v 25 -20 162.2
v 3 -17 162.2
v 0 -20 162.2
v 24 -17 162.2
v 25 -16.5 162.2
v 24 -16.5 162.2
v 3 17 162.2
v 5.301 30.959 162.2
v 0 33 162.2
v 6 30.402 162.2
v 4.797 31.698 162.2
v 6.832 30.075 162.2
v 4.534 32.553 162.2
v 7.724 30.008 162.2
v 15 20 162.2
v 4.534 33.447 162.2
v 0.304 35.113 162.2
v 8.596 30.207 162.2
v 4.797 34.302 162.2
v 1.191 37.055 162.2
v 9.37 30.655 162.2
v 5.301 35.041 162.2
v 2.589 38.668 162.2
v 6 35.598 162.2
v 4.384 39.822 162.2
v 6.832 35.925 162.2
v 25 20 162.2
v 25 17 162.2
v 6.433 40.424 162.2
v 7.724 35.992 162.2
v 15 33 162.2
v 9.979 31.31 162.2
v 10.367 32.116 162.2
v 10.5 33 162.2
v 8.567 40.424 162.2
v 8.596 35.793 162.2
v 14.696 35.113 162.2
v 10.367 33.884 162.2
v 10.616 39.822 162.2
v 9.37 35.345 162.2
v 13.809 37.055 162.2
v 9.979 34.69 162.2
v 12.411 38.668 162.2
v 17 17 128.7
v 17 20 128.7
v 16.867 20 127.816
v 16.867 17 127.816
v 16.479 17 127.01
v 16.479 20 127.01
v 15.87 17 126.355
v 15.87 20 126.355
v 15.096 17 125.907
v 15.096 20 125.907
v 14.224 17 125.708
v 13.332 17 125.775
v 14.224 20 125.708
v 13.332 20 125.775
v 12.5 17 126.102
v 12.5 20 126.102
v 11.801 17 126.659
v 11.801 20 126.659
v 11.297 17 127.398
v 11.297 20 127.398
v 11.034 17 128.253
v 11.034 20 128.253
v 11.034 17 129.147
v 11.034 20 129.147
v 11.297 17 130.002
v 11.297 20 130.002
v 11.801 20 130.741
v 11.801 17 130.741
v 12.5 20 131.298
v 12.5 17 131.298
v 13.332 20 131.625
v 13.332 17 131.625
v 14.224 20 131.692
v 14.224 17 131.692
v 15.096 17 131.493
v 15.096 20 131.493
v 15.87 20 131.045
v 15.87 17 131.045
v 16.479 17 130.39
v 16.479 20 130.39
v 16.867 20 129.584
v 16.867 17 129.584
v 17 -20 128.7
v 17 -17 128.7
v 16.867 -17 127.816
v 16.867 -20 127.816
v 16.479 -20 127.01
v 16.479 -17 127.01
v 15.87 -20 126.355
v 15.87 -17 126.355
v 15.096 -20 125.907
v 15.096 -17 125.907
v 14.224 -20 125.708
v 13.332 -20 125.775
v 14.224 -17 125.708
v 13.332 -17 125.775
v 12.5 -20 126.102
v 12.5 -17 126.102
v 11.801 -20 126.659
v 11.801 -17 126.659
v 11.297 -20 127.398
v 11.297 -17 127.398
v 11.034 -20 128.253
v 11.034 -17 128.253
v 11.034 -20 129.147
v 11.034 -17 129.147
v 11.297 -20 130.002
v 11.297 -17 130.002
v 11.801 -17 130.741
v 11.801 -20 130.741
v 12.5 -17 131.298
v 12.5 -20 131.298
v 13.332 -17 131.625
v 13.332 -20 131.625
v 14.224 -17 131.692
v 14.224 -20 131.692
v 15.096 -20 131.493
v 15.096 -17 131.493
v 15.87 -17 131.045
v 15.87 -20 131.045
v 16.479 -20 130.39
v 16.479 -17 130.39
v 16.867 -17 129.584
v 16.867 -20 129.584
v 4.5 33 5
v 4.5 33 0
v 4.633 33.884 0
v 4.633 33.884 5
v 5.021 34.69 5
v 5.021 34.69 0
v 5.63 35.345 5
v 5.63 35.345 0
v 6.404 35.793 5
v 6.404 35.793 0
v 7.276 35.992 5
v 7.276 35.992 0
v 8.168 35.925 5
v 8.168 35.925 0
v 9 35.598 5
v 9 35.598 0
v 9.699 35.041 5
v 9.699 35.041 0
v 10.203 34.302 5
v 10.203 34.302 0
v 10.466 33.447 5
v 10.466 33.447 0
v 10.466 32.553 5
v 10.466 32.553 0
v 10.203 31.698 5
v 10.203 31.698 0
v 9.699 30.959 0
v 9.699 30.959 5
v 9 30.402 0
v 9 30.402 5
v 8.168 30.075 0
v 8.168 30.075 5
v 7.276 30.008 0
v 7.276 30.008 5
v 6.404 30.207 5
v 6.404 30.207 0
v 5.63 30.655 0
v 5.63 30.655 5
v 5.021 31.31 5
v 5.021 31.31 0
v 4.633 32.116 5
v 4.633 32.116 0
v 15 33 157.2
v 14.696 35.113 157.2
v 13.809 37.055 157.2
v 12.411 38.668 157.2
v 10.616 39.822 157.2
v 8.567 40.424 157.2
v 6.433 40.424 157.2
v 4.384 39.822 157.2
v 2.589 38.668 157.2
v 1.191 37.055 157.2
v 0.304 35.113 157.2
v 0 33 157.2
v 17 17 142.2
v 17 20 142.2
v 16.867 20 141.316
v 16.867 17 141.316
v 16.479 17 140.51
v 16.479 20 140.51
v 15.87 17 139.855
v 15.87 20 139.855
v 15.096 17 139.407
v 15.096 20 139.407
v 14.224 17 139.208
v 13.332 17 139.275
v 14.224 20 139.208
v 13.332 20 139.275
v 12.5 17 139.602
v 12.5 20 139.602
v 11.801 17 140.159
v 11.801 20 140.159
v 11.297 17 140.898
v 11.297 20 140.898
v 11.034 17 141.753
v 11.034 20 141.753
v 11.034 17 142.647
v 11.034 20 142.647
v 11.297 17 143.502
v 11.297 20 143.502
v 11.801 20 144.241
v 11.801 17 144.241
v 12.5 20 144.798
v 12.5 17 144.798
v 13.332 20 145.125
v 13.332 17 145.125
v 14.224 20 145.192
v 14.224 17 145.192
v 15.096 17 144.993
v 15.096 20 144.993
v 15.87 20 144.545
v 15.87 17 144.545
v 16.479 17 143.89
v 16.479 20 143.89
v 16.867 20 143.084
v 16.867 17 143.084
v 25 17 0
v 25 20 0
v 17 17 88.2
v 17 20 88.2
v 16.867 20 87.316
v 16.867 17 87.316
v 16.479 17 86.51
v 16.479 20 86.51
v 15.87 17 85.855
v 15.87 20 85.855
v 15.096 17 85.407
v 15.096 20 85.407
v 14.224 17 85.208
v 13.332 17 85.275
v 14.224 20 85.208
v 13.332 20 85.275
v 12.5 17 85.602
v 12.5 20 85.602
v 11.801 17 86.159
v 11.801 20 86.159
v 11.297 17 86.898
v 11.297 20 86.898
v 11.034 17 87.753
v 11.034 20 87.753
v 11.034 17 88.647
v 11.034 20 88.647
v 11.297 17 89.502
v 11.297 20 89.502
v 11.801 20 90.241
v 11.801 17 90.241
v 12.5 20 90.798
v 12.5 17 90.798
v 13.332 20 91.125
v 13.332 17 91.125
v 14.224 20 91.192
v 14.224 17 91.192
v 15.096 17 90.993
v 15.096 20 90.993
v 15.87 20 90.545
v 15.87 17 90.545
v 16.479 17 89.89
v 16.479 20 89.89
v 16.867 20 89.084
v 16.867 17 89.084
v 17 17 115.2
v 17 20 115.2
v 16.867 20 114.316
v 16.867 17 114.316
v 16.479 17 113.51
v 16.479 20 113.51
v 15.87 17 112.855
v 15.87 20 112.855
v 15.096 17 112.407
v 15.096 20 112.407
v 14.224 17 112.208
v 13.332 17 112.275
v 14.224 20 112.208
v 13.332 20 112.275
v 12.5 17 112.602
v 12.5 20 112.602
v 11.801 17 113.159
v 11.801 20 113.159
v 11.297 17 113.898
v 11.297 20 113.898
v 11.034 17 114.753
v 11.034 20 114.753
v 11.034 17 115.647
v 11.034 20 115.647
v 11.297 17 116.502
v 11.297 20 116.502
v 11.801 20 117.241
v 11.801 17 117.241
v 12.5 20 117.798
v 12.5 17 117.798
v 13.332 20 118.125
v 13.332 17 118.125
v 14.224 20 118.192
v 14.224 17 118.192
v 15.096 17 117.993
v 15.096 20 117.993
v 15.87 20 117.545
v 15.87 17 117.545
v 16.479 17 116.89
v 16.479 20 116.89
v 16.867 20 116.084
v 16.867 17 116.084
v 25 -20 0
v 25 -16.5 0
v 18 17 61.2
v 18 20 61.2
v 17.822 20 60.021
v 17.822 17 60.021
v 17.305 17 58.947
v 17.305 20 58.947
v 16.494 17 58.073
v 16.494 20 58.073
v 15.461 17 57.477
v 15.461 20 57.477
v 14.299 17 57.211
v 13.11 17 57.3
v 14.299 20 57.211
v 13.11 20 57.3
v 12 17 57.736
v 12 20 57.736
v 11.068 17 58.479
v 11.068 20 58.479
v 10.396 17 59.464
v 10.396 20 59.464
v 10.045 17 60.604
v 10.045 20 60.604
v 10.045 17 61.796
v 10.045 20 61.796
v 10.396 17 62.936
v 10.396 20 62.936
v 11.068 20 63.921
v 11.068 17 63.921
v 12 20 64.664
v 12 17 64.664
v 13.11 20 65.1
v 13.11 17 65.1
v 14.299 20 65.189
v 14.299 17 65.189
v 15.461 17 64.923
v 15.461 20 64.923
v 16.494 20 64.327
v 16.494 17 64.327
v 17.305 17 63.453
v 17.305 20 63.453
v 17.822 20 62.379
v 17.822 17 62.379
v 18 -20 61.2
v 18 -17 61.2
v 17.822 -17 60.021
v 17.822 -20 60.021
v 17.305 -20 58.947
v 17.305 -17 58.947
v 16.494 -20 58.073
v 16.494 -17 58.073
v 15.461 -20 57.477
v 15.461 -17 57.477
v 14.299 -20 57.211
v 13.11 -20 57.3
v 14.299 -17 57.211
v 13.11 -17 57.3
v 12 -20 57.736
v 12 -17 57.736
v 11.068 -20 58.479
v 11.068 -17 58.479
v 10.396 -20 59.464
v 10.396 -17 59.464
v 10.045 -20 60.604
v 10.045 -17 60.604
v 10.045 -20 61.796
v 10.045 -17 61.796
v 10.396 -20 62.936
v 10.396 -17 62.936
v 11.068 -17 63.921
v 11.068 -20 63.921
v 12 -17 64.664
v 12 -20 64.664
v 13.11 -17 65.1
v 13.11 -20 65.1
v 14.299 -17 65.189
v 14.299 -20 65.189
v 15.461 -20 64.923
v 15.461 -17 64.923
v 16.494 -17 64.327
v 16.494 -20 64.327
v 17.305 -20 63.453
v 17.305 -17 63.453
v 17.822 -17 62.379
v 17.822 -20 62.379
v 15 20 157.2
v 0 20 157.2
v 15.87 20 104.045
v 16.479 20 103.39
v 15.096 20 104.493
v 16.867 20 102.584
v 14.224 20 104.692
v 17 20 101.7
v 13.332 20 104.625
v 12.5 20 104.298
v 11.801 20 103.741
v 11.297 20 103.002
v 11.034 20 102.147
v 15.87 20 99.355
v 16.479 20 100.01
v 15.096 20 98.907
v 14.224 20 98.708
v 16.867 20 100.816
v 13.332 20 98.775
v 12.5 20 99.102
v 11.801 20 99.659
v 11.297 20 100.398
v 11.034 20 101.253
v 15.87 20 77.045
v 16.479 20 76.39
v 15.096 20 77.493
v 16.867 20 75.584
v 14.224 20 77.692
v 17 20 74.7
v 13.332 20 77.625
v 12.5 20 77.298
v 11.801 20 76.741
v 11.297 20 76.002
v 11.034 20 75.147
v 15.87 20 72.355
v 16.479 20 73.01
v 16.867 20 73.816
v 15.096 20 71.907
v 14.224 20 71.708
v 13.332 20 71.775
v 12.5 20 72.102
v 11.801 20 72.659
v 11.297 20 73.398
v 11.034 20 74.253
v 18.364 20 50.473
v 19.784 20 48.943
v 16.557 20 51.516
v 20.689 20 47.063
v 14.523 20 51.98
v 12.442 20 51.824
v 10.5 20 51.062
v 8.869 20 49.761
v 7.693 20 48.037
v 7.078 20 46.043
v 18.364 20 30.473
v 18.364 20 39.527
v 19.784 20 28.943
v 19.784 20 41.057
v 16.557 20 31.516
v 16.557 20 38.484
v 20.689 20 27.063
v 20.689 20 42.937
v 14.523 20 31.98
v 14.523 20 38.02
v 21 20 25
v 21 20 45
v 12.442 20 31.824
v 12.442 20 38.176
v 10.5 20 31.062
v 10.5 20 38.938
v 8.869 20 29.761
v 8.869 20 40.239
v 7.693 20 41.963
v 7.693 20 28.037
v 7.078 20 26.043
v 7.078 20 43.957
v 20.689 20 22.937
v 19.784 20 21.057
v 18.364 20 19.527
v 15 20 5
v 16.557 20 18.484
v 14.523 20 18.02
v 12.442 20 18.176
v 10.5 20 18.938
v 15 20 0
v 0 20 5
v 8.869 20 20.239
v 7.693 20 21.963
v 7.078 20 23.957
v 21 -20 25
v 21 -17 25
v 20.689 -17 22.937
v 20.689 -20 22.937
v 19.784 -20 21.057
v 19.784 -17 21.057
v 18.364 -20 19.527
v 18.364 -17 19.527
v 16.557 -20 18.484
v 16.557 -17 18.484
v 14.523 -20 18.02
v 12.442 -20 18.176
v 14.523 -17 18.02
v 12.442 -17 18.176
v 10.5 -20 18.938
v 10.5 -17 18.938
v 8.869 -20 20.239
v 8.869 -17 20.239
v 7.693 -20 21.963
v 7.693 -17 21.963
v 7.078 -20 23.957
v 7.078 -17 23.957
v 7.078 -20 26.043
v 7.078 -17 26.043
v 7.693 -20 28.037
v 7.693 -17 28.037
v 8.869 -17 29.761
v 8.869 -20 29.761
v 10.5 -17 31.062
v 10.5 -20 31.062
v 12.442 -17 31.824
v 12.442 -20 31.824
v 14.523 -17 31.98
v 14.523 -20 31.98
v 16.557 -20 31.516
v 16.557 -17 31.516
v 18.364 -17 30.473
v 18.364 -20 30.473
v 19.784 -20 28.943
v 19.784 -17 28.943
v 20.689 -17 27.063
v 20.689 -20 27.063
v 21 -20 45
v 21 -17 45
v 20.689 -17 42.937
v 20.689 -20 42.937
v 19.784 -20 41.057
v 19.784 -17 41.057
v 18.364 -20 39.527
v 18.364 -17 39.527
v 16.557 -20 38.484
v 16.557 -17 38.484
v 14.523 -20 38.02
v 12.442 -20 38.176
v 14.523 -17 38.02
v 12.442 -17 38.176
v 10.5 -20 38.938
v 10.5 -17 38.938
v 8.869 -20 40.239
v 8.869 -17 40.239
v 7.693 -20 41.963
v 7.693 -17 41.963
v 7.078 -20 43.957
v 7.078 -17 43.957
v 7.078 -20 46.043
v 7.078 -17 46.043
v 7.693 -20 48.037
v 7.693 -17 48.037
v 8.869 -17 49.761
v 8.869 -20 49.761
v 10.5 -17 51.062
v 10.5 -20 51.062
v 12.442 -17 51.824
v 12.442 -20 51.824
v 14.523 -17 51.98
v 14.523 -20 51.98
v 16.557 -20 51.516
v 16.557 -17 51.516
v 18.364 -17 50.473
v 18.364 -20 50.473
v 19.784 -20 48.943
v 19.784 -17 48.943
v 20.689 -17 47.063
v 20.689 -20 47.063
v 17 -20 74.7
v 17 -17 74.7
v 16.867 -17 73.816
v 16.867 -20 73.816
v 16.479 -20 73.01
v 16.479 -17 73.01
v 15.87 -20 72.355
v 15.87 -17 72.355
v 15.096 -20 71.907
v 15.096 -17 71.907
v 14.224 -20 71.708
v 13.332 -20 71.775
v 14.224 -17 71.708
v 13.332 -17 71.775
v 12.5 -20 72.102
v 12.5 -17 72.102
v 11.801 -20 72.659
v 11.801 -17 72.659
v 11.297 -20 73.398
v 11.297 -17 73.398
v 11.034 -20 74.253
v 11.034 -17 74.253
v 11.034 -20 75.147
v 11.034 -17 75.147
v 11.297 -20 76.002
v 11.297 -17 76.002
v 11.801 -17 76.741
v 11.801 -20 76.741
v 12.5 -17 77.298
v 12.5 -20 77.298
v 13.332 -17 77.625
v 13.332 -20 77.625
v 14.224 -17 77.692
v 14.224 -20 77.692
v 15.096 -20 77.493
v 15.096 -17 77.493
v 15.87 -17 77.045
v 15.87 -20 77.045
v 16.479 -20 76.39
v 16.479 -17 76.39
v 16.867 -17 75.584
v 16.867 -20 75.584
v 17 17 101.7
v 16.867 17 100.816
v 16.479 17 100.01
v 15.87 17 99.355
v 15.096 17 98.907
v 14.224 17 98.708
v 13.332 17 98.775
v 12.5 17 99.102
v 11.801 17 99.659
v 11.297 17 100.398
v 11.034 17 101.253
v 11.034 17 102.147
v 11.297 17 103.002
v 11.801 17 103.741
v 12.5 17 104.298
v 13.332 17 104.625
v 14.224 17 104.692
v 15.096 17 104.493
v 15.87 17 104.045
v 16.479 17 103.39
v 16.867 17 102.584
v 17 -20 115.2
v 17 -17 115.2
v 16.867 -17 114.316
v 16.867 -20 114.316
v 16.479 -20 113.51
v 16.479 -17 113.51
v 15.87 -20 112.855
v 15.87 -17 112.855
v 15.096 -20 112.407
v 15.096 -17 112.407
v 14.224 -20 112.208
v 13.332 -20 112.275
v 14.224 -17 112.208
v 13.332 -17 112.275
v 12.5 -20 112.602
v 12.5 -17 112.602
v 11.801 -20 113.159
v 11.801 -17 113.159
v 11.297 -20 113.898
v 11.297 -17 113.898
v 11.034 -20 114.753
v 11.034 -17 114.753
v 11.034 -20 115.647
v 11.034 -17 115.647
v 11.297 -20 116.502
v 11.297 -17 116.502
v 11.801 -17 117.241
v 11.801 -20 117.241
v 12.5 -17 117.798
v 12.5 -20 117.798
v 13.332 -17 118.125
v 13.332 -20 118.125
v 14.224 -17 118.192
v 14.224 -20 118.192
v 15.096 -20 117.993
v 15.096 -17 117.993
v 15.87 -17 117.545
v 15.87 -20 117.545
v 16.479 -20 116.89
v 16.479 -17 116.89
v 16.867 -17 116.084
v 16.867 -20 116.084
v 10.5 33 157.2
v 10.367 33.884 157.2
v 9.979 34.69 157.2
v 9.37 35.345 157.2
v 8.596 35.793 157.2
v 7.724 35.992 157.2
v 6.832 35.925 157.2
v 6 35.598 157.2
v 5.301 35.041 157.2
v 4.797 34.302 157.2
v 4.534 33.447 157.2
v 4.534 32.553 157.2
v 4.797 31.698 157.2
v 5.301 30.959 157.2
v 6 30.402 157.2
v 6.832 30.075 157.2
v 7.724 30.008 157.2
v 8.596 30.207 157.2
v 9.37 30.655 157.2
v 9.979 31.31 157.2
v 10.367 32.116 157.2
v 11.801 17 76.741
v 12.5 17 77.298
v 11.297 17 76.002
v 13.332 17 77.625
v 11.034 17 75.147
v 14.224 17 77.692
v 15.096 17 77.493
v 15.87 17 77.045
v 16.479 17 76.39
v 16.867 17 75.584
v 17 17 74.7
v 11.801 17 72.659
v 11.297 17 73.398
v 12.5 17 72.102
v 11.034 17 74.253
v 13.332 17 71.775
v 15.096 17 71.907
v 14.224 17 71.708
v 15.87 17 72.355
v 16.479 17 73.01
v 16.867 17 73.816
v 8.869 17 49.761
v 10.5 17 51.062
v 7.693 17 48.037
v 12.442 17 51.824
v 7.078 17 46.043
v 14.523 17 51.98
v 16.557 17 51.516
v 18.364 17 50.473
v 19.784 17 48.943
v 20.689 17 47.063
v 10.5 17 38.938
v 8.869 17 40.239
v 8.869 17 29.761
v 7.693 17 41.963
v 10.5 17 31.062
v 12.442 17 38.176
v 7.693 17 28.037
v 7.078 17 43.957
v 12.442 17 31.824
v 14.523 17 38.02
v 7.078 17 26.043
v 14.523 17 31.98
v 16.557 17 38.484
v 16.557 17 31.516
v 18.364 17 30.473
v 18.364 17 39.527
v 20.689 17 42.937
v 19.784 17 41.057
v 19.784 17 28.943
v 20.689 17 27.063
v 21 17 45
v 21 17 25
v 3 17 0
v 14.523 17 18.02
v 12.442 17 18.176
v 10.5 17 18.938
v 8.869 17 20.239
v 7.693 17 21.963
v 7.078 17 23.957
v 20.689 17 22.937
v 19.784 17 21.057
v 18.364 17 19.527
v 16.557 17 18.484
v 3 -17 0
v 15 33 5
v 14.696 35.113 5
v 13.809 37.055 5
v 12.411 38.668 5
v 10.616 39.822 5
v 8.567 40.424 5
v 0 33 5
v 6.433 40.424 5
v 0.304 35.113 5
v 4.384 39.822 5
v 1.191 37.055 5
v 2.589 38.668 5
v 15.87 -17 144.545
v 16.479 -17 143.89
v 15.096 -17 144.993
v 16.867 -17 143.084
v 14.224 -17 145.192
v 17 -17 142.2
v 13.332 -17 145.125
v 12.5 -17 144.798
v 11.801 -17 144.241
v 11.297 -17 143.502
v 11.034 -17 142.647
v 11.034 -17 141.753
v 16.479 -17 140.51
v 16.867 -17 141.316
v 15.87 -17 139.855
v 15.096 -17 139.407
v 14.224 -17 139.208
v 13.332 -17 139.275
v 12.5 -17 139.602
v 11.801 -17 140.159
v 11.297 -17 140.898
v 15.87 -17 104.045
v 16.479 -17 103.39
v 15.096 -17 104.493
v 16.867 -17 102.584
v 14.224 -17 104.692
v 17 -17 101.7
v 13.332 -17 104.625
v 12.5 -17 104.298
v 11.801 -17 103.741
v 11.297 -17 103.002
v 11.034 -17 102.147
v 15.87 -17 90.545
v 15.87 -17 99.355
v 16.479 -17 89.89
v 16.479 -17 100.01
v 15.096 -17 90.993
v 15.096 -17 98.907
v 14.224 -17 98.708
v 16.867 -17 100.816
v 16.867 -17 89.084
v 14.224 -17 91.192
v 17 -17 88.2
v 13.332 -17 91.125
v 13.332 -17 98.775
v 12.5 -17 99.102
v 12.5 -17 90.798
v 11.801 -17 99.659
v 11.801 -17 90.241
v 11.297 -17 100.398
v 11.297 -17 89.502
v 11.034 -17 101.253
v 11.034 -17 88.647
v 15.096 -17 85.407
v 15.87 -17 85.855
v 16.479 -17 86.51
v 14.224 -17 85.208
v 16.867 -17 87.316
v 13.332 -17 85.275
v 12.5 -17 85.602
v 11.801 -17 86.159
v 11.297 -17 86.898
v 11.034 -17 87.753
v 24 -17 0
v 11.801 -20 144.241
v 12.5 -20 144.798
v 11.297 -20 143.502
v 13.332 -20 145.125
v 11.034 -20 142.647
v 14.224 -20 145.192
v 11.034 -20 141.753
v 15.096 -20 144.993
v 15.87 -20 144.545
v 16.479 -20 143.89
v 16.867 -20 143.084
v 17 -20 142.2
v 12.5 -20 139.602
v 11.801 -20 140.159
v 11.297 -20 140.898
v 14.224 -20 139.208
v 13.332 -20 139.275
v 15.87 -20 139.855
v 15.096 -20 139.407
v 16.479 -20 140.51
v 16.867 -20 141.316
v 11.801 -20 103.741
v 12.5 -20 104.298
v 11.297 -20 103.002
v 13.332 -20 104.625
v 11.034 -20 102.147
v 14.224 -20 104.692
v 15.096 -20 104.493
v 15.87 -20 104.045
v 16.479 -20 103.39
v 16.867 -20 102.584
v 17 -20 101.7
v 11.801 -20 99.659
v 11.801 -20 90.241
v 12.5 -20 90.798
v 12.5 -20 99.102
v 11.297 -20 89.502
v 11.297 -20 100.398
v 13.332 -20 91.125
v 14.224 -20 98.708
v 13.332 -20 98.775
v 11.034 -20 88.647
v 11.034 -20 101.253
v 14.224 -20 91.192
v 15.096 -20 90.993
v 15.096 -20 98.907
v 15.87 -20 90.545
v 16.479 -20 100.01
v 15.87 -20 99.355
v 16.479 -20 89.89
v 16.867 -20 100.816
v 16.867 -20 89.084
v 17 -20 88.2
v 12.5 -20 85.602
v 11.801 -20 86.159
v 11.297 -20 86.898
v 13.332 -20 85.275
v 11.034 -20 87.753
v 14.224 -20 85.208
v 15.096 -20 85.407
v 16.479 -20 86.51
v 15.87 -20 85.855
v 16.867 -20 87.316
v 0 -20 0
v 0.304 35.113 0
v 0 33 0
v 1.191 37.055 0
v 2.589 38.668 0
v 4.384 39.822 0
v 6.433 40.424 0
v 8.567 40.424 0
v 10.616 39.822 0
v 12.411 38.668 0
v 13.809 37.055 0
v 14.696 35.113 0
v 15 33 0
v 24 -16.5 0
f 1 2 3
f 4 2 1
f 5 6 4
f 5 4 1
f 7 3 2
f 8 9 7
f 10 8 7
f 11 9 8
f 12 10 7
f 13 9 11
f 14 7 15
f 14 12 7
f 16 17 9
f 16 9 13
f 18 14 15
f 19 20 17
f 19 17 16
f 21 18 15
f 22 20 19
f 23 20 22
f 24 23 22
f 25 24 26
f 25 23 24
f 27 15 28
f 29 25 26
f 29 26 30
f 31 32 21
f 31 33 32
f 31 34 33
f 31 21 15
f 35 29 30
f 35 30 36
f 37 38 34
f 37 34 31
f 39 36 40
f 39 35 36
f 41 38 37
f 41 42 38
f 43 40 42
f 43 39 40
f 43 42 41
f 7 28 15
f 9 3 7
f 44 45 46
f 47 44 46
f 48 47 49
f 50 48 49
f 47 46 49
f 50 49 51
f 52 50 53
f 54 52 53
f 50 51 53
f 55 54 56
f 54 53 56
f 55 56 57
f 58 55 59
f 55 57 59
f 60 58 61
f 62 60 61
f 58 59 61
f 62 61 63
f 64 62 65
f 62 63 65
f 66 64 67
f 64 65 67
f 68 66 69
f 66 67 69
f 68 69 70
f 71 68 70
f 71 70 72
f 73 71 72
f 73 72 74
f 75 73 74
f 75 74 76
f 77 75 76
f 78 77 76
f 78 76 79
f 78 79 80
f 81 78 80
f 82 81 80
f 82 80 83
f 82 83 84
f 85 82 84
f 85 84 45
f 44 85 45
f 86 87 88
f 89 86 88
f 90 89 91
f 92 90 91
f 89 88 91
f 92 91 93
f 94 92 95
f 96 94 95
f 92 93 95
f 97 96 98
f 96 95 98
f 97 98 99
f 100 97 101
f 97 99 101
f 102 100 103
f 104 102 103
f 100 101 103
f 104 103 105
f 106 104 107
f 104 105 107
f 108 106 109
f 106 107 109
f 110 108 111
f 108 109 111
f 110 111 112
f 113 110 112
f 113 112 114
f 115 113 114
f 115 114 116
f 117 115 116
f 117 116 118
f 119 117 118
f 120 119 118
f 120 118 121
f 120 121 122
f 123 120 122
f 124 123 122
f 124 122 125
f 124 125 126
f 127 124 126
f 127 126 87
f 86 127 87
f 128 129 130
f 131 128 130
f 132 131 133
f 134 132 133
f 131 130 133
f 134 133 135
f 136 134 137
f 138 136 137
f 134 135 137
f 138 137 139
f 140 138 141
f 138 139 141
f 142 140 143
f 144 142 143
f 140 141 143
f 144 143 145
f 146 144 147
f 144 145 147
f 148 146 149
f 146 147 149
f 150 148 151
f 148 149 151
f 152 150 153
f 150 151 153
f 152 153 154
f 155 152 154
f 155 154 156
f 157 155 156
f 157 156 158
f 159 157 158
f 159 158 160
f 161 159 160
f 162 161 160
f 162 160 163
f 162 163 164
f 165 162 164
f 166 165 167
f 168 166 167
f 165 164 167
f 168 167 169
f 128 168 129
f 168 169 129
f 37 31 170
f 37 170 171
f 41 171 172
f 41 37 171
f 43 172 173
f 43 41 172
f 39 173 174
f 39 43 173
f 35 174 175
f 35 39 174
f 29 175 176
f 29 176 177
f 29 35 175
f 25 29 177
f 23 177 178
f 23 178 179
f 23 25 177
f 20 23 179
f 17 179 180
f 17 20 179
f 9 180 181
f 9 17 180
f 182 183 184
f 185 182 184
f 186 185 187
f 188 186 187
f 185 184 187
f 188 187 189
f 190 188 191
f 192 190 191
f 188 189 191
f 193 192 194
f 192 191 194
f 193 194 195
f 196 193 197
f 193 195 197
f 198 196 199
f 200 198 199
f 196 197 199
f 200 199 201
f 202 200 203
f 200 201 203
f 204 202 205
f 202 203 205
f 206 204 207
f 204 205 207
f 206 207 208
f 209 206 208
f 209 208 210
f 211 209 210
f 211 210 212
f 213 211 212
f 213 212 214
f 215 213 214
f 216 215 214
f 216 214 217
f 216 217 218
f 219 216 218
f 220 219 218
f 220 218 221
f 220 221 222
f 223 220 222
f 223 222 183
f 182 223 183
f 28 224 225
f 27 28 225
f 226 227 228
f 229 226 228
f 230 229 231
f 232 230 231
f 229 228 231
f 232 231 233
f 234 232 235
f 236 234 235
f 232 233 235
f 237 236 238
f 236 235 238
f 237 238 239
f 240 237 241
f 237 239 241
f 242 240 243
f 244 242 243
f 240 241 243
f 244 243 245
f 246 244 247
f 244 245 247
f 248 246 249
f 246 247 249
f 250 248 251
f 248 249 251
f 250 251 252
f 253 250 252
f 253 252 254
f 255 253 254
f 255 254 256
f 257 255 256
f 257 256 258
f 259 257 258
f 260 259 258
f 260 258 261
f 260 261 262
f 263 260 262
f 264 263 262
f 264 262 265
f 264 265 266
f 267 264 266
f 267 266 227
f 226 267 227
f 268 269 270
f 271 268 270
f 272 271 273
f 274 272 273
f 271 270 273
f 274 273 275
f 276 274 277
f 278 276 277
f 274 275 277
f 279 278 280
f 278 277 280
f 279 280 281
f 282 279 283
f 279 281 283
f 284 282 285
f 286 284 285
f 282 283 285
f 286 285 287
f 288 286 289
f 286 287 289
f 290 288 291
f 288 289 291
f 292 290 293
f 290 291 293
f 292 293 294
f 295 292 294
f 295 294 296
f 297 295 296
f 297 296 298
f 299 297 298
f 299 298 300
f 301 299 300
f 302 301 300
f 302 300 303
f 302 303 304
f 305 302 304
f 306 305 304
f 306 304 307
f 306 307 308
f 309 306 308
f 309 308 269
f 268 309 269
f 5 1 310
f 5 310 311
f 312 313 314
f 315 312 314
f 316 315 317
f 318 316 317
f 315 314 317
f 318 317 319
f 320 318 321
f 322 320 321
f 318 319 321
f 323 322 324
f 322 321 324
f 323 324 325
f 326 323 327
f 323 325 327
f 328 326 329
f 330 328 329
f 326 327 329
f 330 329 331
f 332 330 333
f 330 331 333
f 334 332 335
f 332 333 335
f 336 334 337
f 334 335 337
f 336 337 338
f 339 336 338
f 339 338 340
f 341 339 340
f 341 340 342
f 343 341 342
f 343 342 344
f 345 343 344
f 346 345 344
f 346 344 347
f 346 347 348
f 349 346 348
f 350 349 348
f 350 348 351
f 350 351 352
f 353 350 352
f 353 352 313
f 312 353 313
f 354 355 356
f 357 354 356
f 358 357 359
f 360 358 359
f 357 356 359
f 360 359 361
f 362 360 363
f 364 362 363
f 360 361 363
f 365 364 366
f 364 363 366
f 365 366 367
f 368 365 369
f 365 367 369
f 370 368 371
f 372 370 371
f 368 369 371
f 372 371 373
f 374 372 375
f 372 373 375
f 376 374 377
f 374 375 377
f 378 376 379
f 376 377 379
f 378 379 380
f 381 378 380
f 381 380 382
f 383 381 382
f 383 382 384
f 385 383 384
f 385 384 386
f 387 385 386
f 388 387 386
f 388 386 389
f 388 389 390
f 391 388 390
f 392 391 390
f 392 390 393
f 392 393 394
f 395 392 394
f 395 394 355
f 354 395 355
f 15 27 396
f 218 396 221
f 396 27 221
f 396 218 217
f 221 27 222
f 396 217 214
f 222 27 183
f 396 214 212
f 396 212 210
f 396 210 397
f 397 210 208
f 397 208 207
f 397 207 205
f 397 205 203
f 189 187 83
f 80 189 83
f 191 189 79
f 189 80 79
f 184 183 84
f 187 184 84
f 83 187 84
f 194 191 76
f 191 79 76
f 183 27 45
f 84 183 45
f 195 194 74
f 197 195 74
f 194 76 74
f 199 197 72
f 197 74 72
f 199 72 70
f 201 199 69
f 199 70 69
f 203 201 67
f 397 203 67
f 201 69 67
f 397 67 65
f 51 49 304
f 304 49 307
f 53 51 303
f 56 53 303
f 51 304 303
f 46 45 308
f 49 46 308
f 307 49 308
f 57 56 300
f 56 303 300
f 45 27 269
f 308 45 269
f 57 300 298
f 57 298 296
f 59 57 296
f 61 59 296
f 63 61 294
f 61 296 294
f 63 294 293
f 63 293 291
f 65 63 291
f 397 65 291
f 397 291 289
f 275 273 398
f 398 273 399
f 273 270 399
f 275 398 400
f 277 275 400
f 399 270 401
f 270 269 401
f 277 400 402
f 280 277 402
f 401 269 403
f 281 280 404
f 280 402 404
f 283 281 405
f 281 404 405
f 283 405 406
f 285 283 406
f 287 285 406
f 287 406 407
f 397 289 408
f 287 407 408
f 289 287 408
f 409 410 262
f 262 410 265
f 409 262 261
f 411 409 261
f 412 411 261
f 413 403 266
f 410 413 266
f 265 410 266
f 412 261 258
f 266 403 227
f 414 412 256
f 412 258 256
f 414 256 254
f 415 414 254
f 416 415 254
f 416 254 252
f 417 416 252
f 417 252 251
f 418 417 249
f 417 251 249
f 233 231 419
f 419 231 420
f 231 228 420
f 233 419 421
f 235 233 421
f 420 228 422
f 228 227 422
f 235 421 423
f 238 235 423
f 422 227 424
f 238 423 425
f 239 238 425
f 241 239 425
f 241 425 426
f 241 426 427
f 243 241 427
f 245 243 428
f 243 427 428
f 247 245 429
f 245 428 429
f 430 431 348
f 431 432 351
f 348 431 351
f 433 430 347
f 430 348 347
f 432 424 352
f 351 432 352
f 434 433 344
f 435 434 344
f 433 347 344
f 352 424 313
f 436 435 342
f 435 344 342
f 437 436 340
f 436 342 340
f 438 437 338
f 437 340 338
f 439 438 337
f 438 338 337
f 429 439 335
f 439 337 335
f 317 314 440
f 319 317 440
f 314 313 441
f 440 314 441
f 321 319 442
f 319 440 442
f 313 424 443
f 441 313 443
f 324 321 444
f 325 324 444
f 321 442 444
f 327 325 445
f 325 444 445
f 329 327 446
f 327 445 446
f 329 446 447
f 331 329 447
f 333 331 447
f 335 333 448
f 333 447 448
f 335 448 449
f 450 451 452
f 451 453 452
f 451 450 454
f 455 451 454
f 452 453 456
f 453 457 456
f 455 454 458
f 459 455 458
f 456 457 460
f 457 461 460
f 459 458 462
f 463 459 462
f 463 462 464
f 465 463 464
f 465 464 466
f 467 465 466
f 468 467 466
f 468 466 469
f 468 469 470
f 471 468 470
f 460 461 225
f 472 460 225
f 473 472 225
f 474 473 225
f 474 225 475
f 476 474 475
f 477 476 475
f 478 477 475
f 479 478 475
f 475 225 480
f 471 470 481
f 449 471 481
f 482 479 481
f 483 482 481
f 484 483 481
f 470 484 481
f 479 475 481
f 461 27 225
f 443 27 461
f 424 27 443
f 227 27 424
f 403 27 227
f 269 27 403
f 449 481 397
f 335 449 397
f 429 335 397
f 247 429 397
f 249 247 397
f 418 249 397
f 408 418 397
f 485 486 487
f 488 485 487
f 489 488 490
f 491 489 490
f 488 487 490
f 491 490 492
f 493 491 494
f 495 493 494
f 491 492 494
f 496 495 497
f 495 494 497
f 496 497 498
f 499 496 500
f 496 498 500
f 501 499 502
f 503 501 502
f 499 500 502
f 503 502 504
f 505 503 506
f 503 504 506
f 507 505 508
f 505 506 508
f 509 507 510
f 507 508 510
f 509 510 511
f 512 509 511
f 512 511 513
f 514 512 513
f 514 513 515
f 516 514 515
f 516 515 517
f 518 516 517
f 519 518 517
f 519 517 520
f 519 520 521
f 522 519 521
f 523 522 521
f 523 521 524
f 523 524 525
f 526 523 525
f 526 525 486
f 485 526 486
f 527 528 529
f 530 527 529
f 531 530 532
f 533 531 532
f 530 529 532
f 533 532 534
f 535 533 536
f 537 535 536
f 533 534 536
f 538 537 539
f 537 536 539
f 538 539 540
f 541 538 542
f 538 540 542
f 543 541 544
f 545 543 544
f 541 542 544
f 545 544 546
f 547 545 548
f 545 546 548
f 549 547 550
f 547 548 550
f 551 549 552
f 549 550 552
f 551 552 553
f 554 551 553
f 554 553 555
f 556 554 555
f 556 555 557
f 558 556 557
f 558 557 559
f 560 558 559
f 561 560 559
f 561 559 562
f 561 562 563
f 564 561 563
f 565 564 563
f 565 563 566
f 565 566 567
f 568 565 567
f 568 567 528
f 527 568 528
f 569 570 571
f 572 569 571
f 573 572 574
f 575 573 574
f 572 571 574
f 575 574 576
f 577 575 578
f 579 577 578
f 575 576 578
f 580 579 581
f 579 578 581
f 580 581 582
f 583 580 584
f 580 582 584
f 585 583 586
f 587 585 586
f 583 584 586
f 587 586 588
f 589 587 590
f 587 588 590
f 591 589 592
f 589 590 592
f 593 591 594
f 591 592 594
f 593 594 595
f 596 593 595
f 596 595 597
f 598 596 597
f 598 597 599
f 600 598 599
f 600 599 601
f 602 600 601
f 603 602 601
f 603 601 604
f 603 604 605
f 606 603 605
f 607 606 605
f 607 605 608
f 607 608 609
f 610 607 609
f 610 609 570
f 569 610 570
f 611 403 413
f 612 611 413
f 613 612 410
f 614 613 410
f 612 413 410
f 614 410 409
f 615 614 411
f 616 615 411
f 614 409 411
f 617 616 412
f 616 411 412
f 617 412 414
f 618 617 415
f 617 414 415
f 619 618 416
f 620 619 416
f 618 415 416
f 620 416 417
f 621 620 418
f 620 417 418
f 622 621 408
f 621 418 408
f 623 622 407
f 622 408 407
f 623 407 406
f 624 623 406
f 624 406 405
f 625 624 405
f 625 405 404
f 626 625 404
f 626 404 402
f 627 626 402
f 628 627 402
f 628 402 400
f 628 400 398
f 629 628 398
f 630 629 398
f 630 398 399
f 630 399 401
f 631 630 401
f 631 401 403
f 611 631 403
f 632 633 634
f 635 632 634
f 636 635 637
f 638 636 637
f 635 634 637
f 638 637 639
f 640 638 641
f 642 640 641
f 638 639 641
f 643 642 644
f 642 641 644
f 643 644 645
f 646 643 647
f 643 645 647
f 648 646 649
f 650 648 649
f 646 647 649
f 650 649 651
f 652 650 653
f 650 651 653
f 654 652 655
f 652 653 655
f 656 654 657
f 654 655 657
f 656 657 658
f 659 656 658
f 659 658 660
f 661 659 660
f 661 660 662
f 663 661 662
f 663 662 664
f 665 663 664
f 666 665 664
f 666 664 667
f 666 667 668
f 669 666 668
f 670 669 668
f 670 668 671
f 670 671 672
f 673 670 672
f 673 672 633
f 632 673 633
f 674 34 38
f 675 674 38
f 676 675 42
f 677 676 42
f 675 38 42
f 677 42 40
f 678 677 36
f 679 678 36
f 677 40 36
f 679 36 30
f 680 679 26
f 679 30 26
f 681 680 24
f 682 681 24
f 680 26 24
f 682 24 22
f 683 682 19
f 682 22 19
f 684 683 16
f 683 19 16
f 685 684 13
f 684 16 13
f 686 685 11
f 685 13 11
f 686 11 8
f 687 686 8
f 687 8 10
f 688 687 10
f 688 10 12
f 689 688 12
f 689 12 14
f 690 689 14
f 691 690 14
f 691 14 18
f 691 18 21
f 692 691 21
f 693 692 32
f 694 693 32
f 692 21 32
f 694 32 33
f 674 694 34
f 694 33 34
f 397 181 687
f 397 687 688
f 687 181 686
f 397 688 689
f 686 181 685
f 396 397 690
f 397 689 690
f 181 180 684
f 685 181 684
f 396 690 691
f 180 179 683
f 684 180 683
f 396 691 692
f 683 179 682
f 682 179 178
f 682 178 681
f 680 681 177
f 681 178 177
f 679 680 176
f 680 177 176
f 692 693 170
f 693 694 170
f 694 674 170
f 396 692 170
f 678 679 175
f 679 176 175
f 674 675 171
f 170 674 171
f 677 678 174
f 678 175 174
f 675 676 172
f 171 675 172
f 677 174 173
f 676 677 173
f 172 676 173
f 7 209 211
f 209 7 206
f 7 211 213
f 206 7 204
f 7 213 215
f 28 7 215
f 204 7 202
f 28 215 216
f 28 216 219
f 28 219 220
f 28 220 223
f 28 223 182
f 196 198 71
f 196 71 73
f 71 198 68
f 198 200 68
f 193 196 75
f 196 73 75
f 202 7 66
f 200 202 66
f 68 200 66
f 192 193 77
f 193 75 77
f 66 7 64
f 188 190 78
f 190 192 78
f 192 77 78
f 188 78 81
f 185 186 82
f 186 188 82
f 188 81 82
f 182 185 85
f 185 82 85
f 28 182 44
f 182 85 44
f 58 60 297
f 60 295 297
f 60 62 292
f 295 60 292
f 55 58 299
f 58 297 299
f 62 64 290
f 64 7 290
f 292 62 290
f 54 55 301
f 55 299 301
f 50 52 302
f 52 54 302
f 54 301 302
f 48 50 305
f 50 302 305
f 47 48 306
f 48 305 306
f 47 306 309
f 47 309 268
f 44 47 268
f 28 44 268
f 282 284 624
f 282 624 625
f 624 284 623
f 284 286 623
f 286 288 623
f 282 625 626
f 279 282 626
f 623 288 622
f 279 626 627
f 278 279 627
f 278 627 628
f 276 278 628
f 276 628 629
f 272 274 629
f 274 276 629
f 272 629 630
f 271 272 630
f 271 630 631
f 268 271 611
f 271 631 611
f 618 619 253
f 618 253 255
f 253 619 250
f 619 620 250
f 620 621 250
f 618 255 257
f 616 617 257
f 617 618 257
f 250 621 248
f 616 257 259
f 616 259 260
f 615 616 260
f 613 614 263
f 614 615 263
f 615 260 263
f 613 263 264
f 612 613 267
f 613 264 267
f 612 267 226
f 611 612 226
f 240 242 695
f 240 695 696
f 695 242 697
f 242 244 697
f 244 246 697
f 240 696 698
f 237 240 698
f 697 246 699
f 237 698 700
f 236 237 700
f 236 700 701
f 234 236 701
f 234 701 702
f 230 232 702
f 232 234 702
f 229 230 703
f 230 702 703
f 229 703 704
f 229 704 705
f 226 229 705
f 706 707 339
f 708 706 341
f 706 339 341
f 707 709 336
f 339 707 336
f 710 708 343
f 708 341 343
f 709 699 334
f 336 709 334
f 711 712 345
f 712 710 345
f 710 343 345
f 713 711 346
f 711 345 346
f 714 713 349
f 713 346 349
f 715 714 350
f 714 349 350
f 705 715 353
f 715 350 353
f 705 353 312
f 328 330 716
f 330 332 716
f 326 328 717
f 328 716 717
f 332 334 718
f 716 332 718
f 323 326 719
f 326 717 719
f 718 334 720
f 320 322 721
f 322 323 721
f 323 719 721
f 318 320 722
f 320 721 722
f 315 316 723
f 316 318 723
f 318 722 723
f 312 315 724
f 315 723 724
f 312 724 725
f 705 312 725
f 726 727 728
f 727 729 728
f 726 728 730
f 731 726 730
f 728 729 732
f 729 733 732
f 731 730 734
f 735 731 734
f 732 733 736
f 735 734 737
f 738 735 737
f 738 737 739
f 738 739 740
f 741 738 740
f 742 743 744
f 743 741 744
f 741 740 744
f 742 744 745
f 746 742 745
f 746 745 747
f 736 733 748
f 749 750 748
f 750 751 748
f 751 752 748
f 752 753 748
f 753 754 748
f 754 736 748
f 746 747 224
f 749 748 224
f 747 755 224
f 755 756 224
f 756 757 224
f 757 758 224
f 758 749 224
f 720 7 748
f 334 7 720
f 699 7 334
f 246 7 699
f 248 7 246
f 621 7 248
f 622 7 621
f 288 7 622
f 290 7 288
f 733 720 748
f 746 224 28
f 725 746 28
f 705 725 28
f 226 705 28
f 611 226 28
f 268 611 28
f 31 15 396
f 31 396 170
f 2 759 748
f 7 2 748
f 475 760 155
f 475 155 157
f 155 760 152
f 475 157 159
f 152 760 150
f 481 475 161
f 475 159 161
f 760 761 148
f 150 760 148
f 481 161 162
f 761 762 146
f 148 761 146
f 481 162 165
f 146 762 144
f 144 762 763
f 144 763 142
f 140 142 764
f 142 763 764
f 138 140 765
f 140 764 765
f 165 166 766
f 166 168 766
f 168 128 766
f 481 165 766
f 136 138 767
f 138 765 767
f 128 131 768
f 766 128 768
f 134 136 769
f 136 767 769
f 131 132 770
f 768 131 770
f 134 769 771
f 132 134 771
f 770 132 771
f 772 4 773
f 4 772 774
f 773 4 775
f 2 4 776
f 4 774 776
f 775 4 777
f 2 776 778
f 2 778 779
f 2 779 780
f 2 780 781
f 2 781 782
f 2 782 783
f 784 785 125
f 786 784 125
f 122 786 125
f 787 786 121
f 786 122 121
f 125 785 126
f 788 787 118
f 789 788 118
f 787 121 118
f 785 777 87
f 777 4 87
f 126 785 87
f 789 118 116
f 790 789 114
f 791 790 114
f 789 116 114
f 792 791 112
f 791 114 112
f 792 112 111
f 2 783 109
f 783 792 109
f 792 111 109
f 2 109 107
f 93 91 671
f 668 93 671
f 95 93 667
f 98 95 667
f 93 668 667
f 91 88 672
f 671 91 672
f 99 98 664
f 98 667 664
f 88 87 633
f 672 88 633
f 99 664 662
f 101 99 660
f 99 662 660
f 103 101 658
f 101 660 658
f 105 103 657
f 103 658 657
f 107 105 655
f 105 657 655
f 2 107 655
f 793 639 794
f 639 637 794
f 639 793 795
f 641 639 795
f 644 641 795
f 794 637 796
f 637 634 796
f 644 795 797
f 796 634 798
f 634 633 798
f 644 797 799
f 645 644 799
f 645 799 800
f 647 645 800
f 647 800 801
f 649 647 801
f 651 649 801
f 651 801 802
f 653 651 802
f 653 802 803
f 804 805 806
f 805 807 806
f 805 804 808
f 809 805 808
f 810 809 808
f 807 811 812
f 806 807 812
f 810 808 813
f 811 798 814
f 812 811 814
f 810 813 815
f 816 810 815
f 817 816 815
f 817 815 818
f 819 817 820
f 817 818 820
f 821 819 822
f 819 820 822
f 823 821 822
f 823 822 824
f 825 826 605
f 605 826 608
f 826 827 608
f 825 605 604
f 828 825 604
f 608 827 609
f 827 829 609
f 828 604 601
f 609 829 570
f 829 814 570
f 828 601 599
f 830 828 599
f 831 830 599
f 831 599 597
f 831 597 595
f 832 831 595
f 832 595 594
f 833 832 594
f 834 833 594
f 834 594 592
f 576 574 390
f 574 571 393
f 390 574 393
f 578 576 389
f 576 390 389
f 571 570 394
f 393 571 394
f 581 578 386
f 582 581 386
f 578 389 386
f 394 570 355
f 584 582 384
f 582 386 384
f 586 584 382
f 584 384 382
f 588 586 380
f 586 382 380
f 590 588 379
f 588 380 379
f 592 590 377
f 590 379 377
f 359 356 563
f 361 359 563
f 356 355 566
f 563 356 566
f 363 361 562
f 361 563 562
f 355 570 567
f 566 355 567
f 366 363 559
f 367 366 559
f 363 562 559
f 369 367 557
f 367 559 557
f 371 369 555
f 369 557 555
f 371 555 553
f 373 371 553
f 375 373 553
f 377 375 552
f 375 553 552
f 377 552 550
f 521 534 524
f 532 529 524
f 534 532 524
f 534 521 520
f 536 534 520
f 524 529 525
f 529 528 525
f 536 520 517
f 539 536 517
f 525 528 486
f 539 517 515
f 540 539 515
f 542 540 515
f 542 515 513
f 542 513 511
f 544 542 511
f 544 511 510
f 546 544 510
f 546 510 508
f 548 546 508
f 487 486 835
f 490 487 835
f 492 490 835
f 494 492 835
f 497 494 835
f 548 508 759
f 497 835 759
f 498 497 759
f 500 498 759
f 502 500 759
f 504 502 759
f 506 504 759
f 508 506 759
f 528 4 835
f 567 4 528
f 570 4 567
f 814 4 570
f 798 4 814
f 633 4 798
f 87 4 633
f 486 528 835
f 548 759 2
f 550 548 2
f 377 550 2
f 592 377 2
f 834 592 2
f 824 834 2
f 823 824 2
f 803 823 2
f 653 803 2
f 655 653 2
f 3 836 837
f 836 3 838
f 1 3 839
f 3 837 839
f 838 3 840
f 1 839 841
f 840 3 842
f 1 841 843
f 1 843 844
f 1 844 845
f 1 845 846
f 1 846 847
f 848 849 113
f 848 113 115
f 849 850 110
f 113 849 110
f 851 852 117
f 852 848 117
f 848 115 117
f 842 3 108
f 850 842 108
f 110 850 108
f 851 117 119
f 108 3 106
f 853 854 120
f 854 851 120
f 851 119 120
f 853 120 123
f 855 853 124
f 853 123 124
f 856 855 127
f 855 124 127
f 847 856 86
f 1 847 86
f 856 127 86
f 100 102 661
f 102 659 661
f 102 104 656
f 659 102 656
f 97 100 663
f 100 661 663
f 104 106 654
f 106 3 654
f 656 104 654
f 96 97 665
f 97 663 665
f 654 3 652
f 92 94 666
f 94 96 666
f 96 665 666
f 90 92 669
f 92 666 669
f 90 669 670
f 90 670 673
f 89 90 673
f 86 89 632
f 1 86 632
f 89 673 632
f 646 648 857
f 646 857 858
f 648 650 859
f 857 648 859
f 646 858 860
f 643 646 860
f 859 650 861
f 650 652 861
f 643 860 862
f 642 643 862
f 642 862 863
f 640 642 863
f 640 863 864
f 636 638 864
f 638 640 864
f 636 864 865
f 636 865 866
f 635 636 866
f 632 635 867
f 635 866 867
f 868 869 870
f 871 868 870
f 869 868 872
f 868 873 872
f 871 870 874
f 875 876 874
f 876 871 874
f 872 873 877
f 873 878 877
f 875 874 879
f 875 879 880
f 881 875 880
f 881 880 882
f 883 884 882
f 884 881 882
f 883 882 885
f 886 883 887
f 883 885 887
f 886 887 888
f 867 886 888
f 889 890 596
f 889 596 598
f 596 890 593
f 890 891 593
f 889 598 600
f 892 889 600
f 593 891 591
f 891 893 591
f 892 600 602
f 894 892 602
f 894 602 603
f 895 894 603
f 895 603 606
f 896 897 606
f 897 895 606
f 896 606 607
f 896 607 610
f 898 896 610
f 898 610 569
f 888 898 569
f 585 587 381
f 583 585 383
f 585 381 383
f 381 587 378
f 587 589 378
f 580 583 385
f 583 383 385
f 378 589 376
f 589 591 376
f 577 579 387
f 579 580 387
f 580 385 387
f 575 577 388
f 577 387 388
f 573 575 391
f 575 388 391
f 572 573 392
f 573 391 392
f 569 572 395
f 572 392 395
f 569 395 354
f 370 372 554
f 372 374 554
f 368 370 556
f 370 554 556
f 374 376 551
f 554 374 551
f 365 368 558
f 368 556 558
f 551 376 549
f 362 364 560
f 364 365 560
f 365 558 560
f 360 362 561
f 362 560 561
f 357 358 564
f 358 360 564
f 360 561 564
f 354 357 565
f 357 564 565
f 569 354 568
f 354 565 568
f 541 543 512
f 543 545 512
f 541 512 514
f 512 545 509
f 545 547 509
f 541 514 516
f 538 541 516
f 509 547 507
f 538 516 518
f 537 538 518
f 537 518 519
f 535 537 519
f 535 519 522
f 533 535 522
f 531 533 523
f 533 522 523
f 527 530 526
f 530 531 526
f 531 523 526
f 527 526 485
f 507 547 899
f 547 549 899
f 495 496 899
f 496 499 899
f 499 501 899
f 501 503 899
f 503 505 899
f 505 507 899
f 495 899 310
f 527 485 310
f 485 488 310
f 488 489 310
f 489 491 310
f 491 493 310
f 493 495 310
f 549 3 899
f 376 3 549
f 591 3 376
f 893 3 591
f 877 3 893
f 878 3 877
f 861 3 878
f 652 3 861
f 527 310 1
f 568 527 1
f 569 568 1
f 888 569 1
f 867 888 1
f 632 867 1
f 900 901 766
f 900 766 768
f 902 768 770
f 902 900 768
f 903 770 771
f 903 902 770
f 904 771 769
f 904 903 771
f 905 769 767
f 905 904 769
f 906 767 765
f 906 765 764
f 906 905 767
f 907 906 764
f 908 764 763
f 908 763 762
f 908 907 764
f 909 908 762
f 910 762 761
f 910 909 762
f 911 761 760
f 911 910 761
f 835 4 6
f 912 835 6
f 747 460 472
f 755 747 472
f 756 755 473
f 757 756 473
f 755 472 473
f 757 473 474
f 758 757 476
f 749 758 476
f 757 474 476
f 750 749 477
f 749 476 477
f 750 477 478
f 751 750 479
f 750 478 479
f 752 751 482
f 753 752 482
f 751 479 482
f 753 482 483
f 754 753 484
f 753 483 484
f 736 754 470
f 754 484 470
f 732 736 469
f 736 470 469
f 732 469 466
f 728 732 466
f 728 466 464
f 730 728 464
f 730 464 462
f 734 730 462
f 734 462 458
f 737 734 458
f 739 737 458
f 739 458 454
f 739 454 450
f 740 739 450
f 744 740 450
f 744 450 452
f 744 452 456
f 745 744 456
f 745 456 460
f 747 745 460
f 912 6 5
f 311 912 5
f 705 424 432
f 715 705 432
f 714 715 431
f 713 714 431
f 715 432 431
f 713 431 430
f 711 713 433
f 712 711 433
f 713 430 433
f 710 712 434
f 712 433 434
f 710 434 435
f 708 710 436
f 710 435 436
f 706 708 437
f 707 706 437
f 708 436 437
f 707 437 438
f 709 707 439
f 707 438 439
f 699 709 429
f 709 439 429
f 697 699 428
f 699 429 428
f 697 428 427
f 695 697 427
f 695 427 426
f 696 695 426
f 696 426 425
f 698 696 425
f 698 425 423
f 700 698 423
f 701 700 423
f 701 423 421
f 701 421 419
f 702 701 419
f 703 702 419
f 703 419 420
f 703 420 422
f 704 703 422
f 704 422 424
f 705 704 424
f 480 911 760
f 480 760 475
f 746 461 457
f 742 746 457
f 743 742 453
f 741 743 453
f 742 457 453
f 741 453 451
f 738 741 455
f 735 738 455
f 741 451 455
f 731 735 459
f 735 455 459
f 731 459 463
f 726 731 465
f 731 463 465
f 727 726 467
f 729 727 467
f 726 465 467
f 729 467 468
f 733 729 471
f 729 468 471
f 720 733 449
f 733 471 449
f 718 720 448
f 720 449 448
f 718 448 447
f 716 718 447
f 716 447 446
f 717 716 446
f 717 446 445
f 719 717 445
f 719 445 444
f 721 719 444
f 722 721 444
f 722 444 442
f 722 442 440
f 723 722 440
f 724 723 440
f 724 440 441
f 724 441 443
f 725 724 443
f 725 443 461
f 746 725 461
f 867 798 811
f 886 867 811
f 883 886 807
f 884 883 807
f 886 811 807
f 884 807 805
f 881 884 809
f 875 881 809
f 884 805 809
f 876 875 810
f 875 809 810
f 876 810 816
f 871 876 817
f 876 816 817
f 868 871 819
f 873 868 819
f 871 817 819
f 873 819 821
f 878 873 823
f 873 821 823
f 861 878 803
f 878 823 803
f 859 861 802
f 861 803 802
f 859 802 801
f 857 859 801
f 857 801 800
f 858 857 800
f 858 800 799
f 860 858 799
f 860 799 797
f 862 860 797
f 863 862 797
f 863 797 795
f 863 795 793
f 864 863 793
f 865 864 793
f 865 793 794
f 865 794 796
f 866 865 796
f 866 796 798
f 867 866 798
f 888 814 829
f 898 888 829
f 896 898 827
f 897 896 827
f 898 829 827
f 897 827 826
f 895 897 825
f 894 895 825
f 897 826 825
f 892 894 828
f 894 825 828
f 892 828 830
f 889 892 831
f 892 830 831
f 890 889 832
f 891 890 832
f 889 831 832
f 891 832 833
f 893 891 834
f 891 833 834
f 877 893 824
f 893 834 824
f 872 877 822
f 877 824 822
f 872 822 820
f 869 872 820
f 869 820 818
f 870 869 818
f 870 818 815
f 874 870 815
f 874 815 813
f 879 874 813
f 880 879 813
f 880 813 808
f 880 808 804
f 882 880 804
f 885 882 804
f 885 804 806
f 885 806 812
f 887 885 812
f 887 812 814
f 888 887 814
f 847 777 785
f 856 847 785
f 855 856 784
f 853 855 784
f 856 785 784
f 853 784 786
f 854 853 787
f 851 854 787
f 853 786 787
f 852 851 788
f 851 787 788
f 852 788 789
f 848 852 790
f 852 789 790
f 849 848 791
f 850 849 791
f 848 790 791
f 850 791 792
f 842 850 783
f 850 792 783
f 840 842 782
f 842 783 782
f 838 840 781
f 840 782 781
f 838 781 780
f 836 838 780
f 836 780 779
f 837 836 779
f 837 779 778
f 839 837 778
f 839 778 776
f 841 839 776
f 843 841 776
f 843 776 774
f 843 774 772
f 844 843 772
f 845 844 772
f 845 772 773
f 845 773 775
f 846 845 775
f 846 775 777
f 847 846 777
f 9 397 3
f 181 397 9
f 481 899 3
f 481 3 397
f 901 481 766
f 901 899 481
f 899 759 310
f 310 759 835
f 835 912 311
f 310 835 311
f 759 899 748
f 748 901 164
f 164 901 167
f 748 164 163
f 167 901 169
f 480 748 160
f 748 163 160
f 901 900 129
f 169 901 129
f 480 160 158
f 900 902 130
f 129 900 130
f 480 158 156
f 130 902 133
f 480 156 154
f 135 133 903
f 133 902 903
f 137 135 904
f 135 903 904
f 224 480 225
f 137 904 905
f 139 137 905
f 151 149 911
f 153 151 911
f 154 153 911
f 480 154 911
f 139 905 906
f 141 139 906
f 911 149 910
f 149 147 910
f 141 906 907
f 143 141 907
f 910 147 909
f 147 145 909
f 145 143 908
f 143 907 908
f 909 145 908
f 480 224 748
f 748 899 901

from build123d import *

# Parameters (mm, degrees)
EXTRUDE_1_DEPTH     = 162.2
SKETCH_4_R          = 3
EXTRUDE_2_DEPTH     = 5
SKETCH_5_R          = 3
EXTRUDE_3_DEPTH     = 5
SKETCH_6_W          = 1
SKETCH_6_H          = 0.5
EXTRUDE_4_DEPTH     = 162.2
SKETCH_3_R          = 3
SKETCH_3_R_2        = 7
SKETCH_3_R_3        = 4
CUT_EXTRUDE_1_DEPTH = 40


with BuildPart() as part:
    # 스케치1 → 보스-돌출1 (new body)
    with BuildSketch(Plane.XY):
        Polygon((0, -20), (25, -20), (25, -17), (3, -17), (3, 17), (25, 17), (25, 20), (0, 20), align=None)
    extrude(amount=EXTRUDE_1_DEPTH)

    # 스케치4 → 보스-돌출2 (add)
    with BuildSketch(Plane.XY.offset(162.2)):
        with BuildLine():
            Line((0, 33), (0, 20))
            Line((0, 20), (15, 20))
            Line((15, 20), (15, 33))
            ThreePointArc((15, 33), (7.5, 40.5), (0, 33))
        make_face()
        with Locations((7.5, 33)):
            Circle(SKETCH_4_R, mode=Mode.SUBTRACT)
    extrude(amount=-EXTRUDE_2_DEPTH)

    # 스케치5 → 보스-돌출3 (add)
    with BuildSketch(Plane(origin=(0, 0, 0), x_dir=(-1, 0, 0), z_dir=(0, 0, -1))):
        with BuildLine():
            ThreePointArc((0, 33), (-7.5, 40.5), (-15, 33))
            Line((-15, 33), (-15, 20))
            Line((-15, 20), (0, 20))
            Line((0, 20), (0, 33))
        make_face()
        with Locations((-7.5, 33)):
            Circle(SKETCH_5_R, mode=Mode.SUBTRACT)
    extrude(amount=-EXTRUDE_3_DEPTH)

    # 스케치6 → 보스-돌출4 (add)
    with BuildSketch(Plane.XY.offset(162.2)):
        with Locations((24.5, -16.75)):
            Rectangle(SKETCH_6_W, SKETCH_6_H)
    extrude(amount=-EXTRUDE_4_DEPTH)

    # 스케치3 → 컷-돌출1 (cut)
    with BuildSketch(Plane(origin=(0, 20, 0), x_dir=(1, 0, 0), z_dir=(0, 1, 0))):
        with Locations((14, -142.2)):
            Circle(SKETCH_3_R)
        with Locations((14, -128.7)):
            Circle(SKETCH_3_R)
        with Locations((14, -115.2)):
            Circle(SKETCH_3_R)
        with Locations((14, -101.7)):
            Circle(SKETCH_3_R)
        with Locations((14, -74.7)):
            Circle(SKETCH_3_R)
        with Locations((14, -88.2)):
            Circle(SKETCH_3_R)
        with Locations((14, -45)):
            Circle(SKETCH_3_R_2)
        with Locations((14, -25)):
            Circle(SKETCH_3_R_2)
        with Locations((14, -61.2)):
            Circle(SKETCH_3_R_3)
    extrude(amount=-CUT_EXTRUDE_1_DEPTH, mode=Mode.SUBTRACT)


solid = part.part
